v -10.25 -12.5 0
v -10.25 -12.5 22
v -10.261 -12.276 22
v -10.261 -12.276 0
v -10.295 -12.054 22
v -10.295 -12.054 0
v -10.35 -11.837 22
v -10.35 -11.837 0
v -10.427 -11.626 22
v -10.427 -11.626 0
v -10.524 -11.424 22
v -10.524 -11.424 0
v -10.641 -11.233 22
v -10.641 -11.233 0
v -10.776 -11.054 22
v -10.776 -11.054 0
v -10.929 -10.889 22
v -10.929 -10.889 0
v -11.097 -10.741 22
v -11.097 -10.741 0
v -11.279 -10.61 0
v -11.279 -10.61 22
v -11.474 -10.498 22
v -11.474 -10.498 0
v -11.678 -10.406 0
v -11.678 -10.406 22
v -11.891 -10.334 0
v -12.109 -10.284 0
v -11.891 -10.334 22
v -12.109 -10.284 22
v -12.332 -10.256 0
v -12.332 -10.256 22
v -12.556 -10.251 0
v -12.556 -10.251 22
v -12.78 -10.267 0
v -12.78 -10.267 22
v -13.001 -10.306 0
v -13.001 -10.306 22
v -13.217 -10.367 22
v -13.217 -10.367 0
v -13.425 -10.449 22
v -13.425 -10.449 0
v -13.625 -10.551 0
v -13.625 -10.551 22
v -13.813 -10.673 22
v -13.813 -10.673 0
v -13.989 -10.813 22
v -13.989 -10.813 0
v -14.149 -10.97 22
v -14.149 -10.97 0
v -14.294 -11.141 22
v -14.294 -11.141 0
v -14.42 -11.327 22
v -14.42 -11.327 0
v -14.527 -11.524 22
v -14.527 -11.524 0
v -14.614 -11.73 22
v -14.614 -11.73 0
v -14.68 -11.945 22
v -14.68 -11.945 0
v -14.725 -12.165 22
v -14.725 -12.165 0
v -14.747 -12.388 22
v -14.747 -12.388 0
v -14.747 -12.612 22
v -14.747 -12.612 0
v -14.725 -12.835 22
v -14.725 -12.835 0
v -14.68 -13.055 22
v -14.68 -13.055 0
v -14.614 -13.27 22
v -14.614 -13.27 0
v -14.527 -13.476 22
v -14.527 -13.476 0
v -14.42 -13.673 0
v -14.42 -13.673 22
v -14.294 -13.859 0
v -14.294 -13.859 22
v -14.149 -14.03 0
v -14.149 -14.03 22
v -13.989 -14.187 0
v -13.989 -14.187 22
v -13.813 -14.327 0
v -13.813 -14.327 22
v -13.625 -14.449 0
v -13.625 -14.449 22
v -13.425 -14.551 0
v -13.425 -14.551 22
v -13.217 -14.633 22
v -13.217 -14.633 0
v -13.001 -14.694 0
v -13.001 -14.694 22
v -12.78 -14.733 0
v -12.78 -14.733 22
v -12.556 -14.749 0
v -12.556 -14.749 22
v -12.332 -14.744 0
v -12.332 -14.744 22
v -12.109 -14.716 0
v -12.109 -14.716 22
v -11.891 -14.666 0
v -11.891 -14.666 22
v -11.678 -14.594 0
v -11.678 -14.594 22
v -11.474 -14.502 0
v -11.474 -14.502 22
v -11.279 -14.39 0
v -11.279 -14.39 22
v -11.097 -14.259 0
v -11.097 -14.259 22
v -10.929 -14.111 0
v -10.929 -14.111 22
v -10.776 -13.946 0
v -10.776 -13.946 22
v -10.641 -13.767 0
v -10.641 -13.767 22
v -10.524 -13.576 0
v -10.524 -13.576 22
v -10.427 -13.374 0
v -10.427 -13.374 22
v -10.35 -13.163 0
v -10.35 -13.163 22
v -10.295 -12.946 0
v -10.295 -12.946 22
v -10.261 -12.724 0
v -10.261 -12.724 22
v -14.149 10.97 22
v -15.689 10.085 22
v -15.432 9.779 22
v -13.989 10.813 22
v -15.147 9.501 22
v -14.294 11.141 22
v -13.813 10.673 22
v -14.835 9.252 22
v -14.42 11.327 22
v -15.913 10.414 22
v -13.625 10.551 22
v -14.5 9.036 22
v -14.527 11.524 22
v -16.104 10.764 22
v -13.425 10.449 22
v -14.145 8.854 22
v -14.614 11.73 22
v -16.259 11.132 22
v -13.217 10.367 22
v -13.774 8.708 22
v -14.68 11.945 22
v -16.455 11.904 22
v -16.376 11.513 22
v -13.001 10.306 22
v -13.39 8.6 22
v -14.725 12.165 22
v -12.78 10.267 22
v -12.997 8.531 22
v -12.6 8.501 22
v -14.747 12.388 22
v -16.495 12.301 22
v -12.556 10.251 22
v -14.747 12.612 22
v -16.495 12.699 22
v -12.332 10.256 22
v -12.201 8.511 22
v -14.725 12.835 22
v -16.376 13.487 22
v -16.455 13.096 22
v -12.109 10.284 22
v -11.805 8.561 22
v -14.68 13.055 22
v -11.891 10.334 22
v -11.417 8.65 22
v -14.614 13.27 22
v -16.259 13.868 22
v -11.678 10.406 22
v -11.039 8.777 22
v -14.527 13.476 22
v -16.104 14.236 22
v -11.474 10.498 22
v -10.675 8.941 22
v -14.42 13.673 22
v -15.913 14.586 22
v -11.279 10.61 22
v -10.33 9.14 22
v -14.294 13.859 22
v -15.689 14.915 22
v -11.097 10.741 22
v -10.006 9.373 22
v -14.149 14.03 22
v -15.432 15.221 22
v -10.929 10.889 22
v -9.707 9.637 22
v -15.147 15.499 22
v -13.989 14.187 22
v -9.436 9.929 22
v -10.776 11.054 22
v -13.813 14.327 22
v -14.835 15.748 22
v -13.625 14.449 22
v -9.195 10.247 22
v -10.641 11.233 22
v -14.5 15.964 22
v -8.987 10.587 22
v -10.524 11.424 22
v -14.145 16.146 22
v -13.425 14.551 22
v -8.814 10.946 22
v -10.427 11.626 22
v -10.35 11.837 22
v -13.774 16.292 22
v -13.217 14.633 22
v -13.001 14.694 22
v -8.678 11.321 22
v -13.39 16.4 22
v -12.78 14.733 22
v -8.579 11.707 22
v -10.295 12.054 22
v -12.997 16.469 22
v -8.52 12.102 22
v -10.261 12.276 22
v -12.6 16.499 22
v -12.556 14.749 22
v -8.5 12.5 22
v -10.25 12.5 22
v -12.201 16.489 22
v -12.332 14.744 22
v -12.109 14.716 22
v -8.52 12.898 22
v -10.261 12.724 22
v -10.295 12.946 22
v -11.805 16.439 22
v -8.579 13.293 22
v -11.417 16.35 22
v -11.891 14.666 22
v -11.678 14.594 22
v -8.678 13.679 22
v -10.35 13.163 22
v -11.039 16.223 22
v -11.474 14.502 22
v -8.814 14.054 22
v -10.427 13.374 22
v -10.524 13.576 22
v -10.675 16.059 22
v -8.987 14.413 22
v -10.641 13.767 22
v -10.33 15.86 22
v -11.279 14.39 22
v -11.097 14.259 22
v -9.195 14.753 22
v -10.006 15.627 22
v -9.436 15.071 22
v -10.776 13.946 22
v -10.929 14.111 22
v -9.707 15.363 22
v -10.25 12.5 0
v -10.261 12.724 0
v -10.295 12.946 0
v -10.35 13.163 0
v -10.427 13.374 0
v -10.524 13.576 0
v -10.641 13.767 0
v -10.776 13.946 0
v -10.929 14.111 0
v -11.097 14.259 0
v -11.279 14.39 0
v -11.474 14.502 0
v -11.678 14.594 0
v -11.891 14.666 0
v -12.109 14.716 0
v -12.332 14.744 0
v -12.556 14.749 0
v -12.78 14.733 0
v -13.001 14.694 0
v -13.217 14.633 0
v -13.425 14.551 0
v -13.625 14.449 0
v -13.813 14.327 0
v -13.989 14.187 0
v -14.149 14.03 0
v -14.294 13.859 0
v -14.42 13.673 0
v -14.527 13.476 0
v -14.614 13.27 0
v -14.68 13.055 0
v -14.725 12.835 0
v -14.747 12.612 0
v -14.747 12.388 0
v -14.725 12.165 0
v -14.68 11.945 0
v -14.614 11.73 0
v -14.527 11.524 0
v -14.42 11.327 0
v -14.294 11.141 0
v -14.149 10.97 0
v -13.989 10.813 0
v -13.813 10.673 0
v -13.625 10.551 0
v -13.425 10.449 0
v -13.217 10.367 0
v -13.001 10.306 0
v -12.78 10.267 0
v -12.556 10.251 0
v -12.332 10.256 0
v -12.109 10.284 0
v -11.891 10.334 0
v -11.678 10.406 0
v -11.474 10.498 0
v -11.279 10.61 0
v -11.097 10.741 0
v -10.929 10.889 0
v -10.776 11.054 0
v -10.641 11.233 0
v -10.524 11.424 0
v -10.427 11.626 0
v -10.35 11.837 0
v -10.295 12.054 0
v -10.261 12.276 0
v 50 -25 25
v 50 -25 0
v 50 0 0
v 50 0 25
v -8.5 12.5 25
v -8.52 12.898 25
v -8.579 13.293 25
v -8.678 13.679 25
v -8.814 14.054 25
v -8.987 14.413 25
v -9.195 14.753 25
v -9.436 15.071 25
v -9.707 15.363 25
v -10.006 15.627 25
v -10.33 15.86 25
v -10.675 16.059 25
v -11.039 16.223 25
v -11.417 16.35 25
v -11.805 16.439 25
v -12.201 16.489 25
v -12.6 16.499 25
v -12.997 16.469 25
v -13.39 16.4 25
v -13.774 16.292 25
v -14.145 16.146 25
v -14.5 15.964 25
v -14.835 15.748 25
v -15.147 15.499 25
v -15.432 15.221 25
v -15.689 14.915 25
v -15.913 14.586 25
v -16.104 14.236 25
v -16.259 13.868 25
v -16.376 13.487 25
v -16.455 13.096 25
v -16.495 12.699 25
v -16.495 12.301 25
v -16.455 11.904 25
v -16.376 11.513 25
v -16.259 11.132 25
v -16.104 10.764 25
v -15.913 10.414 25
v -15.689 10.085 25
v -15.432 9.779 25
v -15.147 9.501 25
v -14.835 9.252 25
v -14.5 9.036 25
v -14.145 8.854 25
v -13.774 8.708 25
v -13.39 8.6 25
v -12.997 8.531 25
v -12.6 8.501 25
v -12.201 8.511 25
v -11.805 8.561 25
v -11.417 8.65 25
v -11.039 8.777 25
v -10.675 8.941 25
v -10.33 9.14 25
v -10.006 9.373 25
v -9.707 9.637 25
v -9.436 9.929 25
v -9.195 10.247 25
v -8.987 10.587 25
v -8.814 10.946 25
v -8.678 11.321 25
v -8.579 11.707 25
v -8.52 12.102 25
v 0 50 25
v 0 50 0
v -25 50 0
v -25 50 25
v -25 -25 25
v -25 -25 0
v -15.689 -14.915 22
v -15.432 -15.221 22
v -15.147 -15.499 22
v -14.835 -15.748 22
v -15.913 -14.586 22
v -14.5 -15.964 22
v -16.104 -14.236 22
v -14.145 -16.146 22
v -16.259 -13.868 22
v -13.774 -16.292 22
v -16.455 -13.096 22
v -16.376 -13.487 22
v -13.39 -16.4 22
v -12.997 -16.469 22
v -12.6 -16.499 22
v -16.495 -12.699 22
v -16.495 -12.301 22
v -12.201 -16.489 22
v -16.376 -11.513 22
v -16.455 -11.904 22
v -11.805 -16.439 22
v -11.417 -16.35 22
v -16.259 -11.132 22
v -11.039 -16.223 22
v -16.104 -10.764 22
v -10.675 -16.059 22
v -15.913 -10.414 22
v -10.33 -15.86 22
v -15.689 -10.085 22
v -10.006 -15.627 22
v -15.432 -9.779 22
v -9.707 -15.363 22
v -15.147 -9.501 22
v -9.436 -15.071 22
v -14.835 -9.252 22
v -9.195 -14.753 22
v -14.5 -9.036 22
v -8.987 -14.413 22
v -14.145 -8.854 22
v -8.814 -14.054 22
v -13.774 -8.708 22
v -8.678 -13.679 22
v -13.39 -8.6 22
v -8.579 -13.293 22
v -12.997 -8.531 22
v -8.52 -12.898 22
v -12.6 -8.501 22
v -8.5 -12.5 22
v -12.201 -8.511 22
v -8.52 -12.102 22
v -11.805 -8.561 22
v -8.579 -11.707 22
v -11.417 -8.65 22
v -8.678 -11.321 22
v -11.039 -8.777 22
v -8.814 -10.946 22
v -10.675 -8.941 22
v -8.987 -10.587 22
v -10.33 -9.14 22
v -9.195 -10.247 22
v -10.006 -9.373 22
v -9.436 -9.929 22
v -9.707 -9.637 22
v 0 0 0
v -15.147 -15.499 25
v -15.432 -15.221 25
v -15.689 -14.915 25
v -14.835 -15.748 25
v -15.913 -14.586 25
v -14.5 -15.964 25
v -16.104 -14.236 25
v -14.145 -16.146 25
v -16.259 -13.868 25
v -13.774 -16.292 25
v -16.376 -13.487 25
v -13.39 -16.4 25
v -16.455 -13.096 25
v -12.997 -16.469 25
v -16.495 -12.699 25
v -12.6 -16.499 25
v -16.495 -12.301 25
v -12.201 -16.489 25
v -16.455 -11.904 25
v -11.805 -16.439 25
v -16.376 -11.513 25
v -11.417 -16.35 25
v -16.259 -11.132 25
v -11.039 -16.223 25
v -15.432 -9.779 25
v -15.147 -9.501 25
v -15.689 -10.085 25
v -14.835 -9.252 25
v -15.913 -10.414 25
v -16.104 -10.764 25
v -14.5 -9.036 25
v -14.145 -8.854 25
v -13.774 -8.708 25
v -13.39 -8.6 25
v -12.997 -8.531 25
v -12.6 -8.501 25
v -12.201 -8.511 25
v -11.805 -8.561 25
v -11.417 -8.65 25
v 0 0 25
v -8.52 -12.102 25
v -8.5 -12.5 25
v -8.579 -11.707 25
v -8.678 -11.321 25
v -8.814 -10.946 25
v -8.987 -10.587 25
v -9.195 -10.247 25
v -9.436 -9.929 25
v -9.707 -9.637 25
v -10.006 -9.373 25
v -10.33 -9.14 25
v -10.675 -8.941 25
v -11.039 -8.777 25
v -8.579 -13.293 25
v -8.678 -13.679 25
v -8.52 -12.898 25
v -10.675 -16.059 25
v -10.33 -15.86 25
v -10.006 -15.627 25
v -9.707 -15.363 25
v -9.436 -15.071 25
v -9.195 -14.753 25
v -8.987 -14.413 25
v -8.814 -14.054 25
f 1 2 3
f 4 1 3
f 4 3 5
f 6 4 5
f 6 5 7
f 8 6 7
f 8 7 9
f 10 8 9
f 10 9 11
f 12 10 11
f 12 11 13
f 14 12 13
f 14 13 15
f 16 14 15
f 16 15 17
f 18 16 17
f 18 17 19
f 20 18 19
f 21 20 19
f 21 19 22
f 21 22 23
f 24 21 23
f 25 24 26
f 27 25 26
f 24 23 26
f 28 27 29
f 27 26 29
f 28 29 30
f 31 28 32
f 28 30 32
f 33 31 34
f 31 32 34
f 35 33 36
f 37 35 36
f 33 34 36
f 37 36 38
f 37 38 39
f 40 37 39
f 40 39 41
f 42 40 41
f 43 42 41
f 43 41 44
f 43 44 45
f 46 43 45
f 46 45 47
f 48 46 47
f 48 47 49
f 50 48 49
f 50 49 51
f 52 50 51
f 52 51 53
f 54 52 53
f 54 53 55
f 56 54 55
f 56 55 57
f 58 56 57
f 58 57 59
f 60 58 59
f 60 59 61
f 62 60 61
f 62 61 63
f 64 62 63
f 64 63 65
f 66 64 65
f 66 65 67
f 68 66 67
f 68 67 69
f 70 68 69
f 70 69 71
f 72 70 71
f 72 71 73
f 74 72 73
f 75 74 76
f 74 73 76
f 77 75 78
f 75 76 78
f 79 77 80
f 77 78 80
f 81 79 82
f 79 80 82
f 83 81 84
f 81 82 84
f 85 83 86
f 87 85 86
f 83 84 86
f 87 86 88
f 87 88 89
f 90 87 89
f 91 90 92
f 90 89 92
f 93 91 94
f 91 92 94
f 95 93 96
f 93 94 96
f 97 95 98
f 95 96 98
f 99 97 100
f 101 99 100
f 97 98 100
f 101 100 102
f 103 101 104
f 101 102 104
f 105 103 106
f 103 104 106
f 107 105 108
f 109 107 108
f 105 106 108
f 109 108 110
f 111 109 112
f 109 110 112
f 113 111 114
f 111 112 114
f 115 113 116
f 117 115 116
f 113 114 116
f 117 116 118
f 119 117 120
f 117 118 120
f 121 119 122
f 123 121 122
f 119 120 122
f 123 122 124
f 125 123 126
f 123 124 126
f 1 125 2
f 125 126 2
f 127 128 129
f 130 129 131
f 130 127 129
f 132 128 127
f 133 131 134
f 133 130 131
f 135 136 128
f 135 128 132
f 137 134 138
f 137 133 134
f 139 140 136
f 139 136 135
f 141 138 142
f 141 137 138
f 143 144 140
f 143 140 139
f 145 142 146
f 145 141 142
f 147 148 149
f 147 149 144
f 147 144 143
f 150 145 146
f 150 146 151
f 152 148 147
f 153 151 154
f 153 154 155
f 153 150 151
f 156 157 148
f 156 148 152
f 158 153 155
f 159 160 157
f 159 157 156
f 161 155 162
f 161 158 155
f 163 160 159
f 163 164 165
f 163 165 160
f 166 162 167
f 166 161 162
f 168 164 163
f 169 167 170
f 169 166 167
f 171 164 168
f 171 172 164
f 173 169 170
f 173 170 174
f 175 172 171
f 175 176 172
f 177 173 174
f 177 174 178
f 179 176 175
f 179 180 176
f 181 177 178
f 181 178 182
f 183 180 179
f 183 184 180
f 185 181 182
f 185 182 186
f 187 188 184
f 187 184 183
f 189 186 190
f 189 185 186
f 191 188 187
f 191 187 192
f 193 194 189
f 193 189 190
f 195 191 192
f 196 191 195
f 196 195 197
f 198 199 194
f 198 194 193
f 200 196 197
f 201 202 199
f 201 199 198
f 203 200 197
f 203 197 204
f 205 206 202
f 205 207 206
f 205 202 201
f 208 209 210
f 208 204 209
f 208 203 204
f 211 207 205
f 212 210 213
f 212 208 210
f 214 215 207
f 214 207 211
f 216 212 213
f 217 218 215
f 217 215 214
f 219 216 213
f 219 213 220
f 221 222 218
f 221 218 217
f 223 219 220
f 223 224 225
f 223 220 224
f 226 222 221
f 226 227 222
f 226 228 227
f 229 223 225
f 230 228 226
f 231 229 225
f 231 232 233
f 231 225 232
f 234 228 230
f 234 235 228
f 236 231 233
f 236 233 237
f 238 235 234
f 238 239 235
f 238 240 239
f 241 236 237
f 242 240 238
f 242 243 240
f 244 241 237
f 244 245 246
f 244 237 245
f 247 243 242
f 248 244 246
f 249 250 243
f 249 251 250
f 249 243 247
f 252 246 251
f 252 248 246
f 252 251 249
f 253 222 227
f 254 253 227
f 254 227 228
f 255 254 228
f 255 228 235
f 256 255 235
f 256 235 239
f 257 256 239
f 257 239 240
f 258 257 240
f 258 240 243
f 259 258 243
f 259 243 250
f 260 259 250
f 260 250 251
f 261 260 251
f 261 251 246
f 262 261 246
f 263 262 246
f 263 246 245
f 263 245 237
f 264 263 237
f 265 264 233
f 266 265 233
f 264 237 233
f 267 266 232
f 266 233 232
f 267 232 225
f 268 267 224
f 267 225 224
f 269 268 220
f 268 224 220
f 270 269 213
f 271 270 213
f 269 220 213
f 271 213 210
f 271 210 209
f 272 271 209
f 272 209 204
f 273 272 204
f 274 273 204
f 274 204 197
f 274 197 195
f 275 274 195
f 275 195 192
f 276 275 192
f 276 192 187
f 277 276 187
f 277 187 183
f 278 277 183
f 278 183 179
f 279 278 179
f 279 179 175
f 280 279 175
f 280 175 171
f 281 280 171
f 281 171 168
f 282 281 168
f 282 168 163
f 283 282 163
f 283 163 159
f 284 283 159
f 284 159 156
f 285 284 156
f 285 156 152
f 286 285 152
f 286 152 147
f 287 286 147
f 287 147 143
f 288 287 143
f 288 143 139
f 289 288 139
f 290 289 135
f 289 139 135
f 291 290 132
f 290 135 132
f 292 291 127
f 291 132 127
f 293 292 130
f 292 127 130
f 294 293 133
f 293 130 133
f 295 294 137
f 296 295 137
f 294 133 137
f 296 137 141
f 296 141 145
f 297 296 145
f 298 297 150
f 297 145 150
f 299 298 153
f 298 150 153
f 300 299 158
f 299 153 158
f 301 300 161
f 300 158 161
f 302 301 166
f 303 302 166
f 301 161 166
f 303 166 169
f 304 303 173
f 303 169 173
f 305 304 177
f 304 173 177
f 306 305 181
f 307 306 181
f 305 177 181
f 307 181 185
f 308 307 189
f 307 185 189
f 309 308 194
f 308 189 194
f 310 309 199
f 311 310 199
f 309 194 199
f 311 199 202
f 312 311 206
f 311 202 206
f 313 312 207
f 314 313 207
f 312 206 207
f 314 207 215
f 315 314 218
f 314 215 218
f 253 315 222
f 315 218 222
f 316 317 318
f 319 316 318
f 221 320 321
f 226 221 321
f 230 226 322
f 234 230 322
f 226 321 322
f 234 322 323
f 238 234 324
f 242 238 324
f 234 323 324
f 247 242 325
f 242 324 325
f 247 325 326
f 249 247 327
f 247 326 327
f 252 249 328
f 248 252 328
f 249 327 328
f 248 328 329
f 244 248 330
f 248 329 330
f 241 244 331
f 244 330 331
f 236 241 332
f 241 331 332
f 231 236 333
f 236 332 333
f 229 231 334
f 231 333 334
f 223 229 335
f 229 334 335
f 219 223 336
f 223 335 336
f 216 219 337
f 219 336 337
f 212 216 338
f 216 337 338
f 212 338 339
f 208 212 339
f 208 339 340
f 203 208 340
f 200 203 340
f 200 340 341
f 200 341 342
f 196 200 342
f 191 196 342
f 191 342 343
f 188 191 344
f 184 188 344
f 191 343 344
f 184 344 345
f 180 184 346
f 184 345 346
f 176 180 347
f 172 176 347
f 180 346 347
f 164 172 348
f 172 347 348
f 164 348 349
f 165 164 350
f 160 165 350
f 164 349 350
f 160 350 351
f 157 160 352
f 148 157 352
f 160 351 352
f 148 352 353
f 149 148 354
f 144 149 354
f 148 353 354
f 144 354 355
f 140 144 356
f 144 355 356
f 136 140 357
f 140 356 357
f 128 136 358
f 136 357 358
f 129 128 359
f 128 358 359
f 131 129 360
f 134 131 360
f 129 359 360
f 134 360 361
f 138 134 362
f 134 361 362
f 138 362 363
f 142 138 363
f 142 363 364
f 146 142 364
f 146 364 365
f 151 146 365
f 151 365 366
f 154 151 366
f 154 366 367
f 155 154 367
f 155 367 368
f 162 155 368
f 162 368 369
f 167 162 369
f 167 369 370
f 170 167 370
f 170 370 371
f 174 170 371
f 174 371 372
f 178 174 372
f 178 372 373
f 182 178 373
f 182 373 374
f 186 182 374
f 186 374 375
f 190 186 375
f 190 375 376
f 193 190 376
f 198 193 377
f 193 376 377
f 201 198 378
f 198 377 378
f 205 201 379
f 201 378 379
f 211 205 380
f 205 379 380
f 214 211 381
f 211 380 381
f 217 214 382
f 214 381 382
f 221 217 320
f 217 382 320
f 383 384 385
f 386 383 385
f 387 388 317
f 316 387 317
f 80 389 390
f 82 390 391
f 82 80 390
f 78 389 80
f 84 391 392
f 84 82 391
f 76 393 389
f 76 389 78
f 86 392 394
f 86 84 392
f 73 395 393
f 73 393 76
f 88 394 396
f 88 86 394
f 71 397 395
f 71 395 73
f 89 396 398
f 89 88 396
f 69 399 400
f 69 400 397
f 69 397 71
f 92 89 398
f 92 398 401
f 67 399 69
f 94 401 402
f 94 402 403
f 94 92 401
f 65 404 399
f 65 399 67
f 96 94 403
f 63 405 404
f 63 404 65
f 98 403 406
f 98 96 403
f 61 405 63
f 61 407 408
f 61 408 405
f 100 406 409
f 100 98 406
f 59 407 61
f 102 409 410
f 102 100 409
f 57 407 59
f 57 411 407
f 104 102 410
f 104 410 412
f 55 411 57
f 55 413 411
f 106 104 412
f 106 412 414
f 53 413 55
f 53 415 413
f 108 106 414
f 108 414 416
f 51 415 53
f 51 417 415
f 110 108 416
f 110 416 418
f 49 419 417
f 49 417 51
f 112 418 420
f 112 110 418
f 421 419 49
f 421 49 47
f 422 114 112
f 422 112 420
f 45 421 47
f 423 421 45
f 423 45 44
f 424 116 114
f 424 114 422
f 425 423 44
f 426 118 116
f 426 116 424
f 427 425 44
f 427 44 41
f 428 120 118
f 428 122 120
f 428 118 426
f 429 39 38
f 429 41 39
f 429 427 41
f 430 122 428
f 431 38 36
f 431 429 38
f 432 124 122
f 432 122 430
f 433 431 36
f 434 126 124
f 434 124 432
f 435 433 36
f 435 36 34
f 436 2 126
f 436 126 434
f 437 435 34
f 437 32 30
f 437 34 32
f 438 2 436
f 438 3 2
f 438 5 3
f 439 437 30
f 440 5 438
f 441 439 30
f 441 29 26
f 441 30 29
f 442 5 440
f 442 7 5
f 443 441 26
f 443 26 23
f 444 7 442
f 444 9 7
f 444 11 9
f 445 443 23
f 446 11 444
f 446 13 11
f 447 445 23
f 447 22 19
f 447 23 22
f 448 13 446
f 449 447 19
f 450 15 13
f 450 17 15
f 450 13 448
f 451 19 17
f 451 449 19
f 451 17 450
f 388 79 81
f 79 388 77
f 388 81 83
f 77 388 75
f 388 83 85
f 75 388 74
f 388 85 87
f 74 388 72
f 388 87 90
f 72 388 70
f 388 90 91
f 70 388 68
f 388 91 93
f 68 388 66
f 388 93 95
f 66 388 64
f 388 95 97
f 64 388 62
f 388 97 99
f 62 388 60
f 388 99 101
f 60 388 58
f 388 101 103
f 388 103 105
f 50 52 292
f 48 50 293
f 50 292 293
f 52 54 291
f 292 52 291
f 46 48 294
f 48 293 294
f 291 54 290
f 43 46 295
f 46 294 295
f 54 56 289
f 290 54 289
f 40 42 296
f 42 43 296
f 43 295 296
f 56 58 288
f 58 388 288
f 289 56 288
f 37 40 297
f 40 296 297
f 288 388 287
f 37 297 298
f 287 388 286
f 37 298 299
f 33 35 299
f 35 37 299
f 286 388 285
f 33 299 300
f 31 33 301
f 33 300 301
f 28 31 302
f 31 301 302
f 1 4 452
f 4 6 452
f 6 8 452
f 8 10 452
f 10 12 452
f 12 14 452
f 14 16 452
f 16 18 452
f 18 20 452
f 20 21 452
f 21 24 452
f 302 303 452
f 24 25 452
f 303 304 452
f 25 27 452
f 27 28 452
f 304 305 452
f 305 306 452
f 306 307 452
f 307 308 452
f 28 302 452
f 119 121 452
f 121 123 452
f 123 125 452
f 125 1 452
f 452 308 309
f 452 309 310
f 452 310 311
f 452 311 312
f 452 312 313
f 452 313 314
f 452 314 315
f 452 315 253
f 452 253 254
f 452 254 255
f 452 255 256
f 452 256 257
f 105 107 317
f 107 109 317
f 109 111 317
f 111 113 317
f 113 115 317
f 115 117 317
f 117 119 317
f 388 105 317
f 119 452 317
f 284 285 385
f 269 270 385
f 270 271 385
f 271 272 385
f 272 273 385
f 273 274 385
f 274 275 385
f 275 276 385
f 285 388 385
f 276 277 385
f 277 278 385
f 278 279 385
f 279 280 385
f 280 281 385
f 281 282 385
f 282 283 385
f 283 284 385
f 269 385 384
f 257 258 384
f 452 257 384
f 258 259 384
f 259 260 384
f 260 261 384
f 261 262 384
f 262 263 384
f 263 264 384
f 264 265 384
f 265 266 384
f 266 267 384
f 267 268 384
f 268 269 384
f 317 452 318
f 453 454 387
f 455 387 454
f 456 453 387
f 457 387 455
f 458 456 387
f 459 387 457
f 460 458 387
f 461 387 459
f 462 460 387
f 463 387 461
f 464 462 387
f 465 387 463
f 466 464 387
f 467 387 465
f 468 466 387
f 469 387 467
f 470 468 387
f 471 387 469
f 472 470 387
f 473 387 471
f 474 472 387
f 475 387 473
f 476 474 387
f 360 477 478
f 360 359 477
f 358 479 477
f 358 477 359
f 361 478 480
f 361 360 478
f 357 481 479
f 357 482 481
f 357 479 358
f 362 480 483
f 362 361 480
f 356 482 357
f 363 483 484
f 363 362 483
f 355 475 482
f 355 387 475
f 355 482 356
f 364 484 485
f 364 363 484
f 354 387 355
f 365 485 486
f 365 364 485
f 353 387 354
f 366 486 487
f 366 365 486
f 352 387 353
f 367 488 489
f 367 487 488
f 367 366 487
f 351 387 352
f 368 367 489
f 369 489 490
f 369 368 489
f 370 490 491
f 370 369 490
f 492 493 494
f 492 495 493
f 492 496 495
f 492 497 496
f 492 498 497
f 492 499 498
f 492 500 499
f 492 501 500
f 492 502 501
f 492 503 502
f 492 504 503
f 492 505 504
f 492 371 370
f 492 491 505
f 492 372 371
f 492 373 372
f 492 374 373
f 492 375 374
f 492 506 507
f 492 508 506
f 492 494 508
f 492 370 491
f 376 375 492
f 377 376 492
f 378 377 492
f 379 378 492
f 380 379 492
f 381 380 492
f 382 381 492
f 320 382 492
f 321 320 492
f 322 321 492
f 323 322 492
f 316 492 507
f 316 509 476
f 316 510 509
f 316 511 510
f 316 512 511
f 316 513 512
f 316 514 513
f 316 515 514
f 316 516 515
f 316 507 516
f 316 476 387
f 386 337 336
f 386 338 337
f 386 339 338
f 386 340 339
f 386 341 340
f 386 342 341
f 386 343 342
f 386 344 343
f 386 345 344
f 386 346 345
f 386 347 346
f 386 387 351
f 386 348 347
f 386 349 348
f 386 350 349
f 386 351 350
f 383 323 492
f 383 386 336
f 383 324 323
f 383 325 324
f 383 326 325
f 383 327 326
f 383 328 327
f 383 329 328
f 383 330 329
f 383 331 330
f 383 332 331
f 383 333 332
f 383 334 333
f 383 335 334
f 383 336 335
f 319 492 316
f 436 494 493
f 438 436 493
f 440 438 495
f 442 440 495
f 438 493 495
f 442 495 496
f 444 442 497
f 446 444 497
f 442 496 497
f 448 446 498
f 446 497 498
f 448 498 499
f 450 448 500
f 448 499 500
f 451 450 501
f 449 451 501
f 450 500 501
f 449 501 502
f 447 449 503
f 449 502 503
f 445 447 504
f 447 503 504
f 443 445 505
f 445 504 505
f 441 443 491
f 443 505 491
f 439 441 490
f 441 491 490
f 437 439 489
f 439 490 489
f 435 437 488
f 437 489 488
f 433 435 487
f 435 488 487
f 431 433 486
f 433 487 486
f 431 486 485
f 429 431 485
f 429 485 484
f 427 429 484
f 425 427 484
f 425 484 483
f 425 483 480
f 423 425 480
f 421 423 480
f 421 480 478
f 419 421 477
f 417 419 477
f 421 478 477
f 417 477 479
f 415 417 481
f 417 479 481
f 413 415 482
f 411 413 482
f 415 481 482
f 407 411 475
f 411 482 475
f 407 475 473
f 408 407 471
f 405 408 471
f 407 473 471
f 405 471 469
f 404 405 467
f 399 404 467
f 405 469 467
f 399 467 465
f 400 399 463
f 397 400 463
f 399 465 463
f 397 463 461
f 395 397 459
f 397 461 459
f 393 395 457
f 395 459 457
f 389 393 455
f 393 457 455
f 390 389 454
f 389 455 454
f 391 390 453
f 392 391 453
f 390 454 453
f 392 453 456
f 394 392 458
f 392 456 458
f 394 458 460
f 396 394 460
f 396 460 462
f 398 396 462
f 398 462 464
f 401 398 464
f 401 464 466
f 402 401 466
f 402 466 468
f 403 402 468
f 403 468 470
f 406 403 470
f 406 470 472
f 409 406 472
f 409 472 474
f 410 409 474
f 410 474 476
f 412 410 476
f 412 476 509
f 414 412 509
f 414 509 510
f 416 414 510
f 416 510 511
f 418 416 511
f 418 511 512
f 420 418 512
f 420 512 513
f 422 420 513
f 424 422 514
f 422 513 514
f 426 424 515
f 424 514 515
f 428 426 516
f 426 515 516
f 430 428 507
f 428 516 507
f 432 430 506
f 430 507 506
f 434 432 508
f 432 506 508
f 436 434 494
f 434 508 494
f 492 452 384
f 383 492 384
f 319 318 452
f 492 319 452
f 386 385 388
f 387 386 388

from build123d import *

# Parameters (mm, degrees)
BOSS_EXTRUDE1_DEPTH = 25
SKETCH2_R           = 2.25
CUT_EXTRUDE1_DEPTH  = 25
SKETCH3_R           = 4
CUT_EXTRUDE2_DEPTH  = 3


with BuildPart() as part:
    # Sketch1 → Boss-Extrude1 (new body)
    with BuildSketch(Plane.XY):
        Polygon((-25, -25), (50, -25), (50, 0), (0, 0), (0, 50), (-25, 50), align=None)
    extrude(amount=BOSS_EXTRUDE1_DEPTH)

    # Sketch2 → Cut-Extrude1 (cut)
    with BuildSketch(Plane.XY.offset(25)):
        with Locations((-12.5, -12.5)):
            Circle(SKETCH2_R)
        with Locations((-12.5, 12.5)):
            Circle(SKETCH2_R)
    extrude(amount=-CUT_EXTRUDE1_DEPTH, mode=Mode.SUBTRACT)

    # Sketch3 → Cut-Extrude2 (cut)
    with BuildSketch(Plane.XY.offset(25)):
        with Locations((-12.5, 12.5)):
            Circle(SKETCH3_R)
        with Locations((-12.5, -12.5)):
            Circle(SKETCH3_R)
    extrude(amount=-CUT_EXTRUDE2_DEPTH, mode=Mode.SUBTRACT)


solid = part.part
